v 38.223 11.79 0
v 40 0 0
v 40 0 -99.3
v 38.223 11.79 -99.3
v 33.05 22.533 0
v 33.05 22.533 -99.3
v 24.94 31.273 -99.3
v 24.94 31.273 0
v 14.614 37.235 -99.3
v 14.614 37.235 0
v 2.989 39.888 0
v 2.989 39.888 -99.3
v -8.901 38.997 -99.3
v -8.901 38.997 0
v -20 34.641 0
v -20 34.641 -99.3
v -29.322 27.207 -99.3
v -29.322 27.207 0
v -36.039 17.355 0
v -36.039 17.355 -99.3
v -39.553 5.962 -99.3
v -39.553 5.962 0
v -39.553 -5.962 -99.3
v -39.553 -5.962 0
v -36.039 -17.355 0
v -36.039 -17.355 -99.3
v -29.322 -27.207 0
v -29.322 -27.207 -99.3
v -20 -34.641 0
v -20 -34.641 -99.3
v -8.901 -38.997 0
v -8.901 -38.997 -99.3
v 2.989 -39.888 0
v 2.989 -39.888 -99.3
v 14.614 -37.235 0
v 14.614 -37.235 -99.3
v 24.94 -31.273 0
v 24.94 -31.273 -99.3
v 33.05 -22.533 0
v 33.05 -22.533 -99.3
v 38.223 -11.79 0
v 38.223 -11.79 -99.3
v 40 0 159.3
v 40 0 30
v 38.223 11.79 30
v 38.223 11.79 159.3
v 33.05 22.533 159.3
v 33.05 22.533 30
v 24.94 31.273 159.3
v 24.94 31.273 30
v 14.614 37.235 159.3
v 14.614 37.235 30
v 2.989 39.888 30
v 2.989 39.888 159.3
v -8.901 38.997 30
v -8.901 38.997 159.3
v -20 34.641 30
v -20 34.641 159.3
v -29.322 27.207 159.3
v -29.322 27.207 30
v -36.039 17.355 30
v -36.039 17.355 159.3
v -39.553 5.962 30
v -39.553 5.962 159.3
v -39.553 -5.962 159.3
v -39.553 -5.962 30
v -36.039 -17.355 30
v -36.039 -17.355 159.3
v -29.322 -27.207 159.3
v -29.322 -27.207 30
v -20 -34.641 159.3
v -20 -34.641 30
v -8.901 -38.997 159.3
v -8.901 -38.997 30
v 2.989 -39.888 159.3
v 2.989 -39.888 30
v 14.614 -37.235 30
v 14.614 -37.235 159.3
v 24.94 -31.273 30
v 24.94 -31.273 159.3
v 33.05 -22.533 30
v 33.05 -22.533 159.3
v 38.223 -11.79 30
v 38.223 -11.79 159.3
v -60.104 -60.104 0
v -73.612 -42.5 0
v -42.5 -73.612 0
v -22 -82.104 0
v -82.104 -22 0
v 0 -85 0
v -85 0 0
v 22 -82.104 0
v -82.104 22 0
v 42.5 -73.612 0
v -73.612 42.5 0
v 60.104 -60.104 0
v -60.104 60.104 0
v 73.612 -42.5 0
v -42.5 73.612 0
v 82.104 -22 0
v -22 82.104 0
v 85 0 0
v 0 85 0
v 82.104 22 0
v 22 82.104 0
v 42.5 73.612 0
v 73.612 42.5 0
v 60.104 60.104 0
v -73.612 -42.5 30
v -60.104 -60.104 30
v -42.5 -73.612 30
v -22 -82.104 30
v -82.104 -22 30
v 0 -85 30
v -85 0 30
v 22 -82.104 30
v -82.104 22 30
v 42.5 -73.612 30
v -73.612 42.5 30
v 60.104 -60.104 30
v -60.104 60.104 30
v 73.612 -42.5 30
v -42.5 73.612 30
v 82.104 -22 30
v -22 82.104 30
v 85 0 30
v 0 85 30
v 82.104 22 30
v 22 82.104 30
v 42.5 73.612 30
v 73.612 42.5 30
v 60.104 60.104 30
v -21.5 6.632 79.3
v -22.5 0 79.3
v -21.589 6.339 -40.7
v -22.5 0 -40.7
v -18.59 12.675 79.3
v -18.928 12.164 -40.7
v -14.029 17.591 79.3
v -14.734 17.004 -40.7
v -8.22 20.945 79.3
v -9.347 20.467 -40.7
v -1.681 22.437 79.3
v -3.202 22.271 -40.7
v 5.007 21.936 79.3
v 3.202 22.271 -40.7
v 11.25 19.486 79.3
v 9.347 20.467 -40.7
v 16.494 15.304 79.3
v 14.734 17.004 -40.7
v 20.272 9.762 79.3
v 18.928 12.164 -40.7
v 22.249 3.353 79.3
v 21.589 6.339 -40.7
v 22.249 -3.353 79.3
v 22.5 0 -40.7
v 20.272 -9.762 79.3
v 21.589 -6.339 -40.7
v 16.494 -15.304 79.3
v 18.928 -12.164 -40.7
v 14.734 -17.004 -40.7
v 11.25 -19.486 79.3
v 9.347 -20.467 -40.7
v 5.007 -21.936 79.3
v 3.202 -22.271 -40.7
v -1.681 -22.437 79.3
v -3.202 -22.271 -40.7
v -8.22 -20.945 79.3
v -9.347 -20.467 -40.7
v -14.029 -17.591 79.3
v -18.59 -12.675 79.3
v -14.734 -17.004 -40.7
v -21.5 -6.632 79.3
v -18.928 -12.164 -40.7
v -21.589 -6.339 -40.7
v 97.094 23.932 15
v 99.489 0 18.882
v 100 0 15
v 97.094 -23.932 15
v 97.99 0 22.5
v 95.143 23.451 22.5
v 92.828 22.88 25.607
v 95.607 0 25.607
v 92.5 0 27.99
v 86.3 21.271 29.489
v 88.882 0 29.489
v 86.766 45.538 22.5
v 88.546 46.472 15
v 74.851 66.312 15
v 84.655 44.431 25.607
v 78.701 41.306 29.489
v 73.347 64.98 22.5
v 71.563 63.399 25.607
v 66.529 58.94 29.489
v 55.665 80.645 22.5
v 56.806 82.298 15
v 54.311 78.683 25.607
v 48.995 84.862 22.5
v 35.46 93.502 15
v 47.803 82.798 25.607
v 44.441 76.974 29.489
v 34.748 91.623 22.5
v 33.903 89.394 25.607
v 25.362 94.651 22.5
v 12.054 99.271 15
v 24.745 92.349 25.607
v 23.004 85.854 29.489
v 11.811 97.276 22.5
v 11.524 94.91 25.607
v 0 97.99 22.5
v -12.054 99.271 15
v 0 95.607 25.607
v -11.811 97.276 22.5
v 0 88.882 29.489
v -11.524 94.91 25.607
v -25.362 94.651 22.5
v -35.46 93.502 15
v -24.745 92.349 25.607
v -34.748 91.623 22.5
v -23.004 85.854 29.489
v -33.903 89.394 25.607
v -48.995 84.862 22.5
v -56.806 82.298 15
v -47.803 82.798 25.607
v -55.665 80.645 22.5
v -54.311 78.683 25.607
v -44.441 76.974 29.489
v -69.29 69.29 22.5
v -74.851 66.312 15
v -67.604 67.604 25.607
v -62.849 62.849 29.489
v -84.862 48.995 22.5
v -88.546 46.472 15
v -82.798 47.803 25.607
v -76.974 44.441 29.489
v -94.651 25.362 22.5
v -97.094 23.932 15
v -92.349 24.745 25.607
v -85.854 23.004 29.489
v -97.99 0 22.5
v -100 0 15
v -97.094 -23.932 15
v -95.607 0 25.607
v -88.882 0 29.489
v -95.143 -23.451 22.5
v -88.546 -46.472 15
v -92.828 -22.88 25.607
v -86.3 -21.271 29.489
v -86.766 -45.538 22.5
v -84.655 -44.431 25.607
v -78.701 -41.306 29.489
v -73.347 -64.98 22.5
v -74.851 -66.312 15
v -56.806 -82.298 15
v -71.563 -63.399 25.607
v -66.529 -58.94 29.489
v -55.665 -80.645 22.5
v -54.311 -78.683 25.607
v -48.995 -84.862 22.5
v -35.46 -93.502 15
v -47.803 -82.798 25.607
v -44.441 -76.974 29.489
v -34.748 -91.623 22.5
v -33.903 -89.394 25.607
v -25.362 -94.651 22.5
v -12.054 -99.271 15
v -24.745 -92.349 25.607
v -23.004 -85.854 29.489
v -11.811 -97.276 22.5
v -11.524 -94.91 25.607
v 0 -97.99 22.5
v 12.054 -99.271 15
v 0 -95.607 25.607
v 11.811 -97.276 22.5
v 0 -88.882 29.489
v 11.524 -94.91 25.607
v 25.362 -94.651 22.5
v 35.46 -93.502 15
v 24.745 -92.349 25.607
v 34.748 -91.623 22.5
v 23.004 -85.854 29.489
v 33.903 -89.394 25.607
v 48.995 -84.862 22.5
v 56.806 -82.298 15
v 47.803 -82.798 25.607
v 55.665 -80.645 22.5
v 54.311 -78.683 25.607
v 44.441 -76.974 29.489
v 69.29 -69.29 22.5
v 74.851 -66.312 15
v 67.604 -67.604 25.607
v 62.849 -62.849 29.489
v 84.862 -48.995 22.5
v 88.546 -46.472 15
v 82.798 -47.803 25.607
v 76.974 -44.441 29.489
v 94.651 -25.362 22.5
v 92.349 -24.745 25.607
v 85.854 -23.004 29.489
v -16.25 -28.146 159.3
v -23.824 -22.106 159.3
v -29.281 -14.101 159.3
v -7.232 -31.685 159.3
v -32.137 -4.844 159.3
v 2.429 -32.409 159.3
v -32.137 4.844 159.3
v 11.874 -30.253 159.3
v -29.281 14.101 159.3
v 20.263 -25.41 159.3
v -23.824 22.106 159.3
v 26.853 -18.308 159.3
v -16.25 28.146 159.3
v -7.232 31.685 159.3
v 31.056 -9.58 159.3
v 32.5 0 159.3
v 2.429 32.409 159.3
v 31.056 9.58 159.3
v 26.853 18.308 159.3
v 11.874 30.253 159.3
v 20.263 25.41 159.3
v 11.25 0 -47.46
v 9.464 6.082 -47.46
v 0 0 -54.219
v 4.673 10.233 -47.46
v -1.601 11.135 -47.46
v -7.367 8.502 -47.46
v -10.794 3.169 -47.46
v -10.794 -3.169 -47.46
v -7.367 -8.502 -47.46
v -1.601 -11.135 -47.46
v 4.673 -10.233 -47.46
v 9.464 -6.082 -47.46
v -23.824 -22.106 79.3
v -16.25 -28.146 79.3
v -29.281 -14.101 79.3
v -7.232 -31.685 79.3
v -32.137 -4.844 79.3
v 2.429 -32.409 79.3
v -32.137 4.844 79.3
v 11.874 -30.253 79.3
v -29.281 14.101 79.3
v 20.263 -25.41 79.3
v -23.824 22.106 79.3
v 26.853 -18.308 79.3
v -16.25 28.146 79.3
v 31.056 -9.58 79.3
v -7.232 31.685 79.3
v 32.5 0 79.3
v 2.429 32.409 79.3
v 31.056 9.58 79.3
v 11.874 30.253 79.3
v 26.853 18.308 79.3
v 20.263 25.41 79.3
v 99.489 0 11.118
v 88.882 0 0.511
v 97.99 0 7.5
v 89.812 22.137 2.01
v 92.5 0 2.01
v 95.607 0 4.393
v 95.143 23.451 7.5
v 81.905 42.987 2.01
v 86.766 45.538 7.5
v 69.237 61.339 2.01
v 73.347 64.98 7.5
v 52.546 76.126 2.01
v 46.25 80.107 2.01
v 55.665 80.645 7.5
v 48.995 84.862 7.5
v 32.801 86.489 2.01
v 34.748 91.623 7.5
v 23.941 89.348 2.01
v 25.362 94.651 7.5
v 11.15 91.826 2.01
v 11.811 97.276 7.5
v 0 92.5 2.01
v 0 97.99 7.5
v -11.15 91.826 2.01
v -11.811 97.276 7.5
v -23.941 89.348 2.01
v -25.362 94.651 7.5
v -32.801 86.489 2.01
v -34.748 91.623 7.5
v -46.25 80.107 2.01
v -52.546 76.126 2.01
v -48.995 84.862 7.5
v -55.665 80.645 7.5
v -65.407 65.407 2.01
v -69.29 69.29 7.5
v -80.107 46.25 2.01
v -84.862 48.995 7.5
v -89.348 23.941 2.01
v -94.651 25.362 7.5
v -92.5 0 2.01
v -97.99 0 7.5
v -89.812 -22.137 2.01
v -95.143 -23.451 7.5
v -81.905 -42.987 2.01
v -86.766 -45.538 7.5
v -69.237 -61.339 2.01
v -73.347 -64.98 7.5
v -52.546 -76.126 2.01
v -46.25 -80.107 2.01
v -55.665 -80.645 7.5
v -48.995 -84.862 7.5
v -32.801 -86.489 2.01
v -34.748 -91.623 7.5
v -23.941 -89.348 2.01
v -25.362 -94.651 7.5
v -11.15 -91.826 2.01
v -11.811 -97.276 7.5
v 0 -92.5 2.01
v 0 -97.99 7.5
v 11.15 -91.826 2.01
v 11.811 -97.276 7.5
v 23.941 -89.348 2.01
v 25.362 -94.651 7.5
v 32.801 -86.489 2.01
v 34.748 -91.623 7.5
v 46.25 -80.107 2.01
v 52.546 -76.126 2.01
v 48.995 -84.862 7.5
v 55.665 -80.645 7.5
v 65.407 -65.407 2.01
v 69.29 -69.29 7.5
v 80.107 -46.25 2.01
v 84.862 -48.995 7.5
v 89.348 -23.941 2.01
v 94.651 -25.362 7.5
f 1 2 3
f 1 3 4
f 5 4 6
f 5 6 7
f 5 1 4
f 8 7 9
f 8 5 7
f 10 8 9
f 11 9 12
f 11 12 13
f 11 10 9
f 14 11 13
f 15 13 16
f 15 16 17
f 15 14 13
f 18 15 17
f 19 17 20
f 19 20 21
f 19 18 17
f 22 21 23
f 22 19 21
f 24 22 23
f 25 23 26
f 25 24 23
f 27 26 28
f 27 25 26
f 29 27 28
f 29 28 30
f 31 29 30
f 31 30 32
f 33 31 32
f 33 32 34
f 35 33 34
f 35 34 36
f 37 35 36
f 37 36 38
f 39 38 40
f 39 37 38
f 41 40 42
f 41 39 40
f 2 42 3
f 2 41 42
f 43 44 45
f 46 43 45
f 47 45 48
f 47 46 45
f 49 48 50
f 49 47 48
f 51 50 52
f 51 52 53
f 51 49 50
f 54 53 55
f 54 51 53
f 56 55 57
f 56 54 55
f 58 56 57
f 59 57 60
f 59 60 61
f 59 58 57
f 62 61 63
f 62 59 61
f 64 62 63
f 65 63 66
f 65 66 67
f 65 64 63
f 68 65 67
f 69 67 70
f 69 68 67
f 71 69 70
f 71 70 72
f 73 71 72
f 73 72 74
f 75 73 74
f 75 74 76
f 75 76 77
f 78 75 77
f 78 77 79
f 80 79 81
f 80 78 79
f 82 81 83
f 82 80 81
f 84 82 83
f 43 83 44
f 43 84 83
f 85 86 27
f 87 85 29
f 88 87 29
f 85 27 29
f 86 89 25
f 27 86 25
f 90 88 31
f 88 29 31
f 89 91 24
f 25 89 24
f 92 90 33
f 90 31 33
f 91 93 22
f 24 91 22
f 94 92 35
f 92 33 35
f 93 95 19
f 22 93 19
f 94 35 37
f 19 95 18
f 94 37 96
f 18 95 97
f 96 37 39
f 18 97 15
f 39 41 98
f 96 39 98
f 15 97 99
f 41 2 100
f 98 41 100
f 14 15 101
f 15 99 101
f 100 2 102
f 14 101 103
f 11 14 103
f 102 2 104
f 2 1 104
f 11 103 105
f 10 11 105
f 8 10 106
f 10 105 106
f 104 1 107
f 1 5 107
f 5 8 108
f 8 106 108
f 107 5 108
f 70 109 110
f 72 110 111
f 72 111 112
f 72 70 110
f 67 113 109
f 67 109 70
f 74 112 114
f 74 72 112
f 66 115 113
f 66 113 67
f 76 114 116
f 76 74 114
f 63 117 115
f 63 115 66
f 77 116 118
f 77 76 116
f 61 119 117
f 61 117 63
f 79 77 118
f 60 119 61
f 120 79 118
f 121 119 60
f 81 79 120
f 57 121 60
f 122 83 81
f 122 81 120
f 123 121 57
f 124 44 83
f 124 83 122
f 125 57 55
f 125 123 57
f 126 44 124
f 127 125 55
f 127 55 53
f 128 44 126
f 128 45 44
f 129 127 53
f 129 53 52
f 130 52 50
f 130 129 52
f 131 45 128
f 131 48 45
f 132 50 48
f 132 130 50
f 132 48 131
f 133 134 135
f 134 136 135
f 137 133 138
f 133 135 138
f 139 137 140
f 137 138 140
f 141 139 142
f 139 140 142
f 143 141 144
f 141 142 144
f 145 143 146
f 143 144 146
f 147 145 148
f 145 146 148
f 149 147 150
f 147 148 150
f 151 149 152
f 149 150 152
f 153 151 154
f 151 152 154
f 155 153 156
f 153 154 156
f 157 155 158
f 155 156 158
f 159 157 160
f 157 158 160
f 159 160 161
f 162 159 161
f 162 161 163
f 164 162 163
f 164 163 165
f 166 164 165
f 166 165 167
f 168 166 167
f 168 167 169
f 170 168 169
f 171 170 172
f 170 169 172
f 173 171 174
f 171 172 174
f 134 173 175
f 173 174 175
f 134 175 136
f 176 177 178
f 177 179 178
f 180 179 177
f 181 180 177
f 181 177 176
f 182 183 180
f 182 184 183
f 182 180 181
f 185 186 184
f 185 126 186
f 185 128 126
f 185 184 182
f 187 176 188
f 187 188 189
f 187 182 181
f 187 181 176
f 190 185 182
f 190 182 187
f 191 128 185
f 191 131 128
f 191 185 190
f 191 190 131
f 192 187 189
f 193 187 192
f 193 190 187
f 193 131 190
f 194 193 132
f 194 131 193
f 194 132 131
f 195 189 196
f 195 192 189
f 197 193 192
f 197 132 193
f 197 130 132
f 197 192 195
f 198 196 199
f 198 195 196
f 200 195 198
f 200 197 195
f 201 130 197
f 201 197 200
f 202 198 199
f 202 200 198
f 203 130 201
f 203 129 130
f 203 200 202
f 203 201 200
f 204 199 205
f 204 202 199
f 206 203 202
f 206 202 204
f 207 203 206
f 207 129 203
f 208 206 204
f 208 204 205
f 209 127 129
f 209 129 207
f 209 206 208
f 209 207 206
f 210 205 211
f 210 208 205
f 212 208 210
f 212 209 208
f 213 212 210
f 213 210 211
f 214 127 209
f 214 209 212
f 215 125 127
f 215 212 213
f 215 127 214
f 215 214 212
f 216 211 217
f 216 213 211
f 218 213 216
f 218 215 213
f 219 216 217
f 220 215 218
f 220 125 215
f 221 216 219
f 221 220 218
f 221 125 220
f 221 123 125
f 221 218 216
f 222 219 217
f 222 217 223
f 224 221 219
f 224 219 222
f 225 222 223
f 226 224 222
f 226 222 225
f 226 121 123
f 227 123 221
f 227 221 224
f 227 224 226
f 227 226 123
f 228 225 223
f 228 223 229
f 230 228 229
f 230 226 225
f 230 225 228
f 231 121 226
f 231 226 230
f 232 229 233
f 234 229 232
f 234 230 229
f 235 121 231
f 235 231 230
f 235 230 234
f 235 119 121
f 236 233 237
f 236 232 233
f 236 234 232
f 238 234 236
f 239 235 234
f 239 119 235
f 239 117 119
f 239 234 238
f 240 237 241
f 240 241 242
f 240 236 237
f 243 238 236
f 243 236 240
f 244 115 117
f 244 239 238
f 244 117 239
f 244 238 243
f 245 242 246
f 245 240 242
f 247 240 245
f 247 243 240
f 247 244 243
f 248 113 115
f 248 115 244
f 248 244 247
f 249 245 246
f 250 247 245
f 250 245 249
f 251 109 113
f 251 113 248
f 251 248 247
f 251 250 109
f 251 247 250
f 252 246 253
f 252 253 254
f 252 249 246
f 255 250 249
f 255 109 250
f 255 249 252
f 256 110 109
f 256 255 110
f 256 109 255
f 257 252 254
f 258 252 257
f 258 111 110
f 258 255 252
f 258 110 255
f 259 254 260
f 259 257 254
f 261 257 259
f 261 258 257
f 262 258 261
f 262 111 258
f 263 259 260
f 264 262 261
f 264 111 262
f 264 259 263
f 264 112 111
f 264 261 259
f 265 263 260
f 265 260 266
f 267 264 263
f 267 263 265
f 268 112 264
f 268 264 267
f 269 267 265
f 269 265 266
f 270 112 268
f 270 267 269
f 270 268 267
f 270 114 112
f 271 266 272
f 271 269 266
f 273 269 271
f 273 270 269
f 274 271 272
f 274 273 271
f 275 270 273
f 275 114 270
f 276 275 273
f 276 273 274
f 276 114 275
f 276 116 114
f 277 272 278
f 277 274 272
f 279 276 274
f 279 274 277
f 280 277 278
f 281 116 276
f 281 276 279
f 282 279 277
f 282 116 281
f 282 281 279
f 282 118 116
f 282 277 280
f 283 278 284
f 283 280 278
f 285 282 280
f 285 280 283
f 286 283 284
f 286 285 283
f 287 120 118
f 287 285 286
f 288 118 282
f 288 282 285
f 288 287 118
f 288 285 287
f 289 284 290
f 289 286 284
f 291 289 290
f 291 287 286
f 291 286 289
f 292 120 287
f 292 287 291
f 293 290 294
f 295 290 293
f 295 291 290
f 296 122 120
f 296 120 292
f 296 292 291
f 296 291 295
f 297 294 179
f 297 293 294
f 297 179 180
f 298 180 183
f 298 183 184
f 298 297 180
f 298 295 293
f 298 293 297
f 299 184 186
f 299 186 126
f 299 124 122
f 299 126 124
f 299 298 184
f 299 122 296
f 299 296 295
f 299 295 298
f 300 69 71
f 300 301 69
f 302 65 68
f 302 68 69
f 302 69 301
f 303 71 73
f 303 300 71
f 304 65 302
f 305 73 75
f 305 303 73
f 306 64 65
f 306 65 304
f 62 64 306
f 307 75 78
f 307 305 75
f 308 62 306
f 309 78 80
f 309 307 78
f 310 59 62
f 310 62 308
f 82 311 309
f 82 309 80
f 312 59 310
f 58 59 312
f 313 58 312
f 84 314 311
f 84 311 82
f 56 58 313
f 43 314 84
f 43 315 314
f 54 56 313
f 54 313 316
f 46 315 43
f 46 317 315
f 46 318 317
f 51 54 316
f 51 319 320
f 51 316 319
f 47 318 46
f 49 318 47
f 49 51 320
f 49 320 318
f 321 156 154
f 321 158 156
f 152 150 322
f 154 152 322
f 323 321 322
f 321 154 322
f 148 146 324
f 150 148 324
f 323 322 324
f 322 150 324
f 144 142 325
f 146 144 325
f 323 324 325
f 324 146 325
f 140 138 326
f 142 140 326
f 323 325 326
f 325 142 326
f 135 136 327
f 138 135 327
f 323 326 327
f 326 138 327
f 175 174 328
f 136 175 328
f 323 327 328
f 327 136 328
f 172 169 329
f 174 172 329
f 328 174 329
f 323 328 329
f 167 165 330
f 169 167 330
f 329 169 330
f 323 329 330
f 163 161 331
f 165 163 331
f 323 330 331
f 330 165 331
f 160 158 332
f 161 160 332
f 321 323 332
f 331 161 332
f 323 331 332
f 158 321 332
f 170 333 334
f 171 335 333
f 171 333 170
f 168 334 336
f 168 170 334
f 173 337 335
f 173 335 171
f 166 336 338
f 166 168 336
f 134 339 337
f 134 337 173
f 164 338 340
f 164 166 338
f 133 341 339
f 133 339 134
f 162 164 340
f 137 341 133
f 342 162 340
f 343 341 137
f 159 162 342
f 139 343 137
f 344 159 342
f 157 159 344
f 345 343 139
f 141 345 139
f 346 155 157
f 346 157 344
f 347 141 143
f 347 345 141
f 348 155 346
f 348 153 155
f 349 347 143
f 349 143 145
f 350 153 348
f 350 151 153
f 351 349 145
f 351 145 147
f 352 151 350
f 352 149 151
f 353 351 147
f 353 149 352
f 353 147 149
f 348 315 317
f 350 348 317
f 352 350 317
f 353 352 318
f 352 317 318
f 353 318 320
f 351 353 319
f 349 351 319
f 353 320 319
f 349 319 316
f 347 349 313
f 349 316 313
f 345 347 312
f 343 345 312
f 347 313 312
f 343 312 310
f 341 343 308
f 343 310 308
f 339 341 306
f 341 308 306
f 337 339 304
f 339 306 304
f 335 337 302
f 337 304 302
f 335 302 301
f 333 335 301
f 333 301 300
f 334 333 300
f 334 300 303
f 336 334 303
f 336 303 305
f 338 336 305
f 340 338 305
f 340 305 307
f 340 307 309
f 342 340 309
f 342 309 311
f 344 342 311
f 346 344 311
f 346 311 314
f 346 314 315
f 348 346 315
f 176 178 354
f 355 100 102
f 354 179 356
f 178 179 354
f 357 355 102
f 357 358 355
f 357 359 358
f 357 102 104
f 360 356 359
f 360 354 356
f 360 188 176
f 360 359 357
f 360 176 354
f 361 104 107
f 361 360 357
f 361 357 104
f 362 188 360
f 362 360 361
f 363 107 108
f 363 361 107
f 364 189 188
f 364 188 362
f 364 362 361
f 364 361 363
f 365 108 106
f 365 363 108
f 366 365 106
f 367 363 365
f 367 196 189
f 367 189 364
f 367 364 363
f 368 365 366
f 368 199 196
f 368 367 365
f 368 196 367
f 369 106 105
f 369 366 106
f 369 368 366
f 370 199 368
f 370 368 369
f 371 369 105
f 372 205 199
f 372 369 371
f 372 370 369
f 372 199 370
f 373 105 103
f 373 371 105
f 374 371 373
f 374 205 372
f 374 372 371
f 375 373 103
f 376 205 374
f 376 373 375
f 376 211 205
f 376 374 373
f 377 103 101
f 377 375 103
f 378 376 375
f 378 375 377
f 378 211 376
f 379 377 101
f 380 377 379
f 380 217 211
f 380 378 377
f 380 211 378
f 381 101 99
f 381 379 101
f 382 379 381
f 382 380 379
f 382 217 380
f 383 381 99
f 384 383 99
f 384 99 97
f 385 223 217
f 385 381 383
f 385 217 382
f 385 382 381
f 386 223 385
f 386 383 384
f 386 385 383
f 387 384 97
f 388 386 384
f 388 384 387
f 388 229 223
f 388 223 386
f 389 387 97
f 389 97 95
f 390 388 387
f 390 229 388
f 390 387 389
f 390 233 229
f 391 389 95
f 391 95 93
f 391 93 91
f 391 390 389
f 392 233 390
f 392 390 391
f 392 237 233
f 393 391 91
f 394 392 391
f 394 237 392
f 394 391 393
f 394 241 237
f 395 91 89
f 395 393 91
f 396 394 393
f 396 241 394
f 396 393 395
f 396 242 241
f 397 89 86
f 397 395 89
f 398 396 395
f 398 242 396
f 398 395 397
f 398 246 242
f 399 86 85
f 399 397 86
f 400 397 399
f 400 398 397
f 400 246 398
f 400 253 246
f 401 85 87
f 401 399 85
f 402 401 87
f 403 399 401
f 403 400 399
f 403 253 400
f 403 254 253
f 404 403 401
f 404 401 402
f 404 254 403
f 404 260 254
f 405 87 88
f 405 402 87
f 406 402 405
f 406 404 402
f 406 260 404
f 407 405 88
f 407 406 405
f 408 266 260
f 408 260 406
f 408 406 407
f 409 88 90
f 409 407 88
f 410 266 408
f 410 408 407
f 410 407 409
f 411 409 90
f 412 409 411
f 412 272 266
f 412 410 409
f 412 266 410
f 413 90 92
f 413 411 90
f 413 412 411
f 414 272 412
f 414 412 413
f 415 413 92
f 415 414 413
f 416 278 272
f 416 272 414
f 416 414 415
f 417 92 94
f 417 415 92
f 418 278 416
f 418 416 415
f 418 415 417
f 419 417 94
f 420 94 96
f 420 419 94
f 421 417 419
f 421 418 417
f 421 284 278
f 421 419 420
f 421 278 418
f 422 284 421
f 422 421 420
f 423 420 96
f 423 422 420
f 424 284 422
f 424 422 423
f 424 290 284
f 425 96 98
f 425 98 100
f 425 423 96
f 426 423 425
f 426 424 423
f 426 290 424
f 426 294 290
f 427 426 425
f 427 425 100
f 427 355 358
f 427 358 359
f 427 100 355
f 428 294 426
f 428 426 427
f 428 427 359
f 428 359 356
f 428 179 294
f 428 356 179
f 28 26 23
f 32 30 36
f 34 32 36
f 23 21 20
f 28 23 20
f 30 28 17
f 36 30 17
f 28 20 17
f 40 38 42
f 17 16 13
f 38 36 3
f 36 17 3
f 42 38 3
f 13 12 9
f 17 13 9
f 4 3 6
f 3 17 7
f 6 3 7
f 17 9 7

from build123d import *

# Parameters (mm, degrees)
F0_R           = 100
F1_DEPTH       = 30
F2_R           = 40
F3_DEPTH       = 129.3
F4_R           = 14.99999
F6_D           = 45
F6_DEPTH       = 200
F6_CBORE_D     = 65
F6_CBORE_DEPTH = 80
F6_TIP         = 13.5193639281


# Not quite as in the source:
# - a fillet or chamfer is up to 0.001 mm smaller than in the source, because OpenCascade refuses the exact size


with BuildPart() as f1:
    # F0 (on Top) → F1 (new body)
    with BuildSketch(Plane.XY):
        Circle(F0_R)
    extrude(amount=F1_DEPTH)

    # F2 (on face) → F3 (join, symmetric)
    with BuildSketch(Plane.XY.offset(30)):
        Circle(F2_R)
    extrude(amount=F3_DEPTH, both=True)

    # F4 (radius 15 in the source; OpenCascade refuses exactly that, so slightly less here)
    f4_edges = [f1.edges().sort_by_distance(p)[0] for p in [
        (-100, 0, 30),
        (100, 0, 15),
        (-100, 0, 0),
    ]]
    fillet(f4_edges, radius=F4_R)

    # F6
    with Locations(Plane.XY.offset(159.3)):
        with Locations((0, 0)):
            CounterBoreHole(F6_D / 2, F6_CBORE_D / 2, F6_CBORE_DEPTH, depth=F6_DEPTH)
            with Locations((0, 0, -(F6_DEPTH + F6_TIP / 2))):  # 118° drill point
                Cone(0, F6_D / 2, F6_TIP, mode=Mode.SUBTRACT)


solid = f1.part
